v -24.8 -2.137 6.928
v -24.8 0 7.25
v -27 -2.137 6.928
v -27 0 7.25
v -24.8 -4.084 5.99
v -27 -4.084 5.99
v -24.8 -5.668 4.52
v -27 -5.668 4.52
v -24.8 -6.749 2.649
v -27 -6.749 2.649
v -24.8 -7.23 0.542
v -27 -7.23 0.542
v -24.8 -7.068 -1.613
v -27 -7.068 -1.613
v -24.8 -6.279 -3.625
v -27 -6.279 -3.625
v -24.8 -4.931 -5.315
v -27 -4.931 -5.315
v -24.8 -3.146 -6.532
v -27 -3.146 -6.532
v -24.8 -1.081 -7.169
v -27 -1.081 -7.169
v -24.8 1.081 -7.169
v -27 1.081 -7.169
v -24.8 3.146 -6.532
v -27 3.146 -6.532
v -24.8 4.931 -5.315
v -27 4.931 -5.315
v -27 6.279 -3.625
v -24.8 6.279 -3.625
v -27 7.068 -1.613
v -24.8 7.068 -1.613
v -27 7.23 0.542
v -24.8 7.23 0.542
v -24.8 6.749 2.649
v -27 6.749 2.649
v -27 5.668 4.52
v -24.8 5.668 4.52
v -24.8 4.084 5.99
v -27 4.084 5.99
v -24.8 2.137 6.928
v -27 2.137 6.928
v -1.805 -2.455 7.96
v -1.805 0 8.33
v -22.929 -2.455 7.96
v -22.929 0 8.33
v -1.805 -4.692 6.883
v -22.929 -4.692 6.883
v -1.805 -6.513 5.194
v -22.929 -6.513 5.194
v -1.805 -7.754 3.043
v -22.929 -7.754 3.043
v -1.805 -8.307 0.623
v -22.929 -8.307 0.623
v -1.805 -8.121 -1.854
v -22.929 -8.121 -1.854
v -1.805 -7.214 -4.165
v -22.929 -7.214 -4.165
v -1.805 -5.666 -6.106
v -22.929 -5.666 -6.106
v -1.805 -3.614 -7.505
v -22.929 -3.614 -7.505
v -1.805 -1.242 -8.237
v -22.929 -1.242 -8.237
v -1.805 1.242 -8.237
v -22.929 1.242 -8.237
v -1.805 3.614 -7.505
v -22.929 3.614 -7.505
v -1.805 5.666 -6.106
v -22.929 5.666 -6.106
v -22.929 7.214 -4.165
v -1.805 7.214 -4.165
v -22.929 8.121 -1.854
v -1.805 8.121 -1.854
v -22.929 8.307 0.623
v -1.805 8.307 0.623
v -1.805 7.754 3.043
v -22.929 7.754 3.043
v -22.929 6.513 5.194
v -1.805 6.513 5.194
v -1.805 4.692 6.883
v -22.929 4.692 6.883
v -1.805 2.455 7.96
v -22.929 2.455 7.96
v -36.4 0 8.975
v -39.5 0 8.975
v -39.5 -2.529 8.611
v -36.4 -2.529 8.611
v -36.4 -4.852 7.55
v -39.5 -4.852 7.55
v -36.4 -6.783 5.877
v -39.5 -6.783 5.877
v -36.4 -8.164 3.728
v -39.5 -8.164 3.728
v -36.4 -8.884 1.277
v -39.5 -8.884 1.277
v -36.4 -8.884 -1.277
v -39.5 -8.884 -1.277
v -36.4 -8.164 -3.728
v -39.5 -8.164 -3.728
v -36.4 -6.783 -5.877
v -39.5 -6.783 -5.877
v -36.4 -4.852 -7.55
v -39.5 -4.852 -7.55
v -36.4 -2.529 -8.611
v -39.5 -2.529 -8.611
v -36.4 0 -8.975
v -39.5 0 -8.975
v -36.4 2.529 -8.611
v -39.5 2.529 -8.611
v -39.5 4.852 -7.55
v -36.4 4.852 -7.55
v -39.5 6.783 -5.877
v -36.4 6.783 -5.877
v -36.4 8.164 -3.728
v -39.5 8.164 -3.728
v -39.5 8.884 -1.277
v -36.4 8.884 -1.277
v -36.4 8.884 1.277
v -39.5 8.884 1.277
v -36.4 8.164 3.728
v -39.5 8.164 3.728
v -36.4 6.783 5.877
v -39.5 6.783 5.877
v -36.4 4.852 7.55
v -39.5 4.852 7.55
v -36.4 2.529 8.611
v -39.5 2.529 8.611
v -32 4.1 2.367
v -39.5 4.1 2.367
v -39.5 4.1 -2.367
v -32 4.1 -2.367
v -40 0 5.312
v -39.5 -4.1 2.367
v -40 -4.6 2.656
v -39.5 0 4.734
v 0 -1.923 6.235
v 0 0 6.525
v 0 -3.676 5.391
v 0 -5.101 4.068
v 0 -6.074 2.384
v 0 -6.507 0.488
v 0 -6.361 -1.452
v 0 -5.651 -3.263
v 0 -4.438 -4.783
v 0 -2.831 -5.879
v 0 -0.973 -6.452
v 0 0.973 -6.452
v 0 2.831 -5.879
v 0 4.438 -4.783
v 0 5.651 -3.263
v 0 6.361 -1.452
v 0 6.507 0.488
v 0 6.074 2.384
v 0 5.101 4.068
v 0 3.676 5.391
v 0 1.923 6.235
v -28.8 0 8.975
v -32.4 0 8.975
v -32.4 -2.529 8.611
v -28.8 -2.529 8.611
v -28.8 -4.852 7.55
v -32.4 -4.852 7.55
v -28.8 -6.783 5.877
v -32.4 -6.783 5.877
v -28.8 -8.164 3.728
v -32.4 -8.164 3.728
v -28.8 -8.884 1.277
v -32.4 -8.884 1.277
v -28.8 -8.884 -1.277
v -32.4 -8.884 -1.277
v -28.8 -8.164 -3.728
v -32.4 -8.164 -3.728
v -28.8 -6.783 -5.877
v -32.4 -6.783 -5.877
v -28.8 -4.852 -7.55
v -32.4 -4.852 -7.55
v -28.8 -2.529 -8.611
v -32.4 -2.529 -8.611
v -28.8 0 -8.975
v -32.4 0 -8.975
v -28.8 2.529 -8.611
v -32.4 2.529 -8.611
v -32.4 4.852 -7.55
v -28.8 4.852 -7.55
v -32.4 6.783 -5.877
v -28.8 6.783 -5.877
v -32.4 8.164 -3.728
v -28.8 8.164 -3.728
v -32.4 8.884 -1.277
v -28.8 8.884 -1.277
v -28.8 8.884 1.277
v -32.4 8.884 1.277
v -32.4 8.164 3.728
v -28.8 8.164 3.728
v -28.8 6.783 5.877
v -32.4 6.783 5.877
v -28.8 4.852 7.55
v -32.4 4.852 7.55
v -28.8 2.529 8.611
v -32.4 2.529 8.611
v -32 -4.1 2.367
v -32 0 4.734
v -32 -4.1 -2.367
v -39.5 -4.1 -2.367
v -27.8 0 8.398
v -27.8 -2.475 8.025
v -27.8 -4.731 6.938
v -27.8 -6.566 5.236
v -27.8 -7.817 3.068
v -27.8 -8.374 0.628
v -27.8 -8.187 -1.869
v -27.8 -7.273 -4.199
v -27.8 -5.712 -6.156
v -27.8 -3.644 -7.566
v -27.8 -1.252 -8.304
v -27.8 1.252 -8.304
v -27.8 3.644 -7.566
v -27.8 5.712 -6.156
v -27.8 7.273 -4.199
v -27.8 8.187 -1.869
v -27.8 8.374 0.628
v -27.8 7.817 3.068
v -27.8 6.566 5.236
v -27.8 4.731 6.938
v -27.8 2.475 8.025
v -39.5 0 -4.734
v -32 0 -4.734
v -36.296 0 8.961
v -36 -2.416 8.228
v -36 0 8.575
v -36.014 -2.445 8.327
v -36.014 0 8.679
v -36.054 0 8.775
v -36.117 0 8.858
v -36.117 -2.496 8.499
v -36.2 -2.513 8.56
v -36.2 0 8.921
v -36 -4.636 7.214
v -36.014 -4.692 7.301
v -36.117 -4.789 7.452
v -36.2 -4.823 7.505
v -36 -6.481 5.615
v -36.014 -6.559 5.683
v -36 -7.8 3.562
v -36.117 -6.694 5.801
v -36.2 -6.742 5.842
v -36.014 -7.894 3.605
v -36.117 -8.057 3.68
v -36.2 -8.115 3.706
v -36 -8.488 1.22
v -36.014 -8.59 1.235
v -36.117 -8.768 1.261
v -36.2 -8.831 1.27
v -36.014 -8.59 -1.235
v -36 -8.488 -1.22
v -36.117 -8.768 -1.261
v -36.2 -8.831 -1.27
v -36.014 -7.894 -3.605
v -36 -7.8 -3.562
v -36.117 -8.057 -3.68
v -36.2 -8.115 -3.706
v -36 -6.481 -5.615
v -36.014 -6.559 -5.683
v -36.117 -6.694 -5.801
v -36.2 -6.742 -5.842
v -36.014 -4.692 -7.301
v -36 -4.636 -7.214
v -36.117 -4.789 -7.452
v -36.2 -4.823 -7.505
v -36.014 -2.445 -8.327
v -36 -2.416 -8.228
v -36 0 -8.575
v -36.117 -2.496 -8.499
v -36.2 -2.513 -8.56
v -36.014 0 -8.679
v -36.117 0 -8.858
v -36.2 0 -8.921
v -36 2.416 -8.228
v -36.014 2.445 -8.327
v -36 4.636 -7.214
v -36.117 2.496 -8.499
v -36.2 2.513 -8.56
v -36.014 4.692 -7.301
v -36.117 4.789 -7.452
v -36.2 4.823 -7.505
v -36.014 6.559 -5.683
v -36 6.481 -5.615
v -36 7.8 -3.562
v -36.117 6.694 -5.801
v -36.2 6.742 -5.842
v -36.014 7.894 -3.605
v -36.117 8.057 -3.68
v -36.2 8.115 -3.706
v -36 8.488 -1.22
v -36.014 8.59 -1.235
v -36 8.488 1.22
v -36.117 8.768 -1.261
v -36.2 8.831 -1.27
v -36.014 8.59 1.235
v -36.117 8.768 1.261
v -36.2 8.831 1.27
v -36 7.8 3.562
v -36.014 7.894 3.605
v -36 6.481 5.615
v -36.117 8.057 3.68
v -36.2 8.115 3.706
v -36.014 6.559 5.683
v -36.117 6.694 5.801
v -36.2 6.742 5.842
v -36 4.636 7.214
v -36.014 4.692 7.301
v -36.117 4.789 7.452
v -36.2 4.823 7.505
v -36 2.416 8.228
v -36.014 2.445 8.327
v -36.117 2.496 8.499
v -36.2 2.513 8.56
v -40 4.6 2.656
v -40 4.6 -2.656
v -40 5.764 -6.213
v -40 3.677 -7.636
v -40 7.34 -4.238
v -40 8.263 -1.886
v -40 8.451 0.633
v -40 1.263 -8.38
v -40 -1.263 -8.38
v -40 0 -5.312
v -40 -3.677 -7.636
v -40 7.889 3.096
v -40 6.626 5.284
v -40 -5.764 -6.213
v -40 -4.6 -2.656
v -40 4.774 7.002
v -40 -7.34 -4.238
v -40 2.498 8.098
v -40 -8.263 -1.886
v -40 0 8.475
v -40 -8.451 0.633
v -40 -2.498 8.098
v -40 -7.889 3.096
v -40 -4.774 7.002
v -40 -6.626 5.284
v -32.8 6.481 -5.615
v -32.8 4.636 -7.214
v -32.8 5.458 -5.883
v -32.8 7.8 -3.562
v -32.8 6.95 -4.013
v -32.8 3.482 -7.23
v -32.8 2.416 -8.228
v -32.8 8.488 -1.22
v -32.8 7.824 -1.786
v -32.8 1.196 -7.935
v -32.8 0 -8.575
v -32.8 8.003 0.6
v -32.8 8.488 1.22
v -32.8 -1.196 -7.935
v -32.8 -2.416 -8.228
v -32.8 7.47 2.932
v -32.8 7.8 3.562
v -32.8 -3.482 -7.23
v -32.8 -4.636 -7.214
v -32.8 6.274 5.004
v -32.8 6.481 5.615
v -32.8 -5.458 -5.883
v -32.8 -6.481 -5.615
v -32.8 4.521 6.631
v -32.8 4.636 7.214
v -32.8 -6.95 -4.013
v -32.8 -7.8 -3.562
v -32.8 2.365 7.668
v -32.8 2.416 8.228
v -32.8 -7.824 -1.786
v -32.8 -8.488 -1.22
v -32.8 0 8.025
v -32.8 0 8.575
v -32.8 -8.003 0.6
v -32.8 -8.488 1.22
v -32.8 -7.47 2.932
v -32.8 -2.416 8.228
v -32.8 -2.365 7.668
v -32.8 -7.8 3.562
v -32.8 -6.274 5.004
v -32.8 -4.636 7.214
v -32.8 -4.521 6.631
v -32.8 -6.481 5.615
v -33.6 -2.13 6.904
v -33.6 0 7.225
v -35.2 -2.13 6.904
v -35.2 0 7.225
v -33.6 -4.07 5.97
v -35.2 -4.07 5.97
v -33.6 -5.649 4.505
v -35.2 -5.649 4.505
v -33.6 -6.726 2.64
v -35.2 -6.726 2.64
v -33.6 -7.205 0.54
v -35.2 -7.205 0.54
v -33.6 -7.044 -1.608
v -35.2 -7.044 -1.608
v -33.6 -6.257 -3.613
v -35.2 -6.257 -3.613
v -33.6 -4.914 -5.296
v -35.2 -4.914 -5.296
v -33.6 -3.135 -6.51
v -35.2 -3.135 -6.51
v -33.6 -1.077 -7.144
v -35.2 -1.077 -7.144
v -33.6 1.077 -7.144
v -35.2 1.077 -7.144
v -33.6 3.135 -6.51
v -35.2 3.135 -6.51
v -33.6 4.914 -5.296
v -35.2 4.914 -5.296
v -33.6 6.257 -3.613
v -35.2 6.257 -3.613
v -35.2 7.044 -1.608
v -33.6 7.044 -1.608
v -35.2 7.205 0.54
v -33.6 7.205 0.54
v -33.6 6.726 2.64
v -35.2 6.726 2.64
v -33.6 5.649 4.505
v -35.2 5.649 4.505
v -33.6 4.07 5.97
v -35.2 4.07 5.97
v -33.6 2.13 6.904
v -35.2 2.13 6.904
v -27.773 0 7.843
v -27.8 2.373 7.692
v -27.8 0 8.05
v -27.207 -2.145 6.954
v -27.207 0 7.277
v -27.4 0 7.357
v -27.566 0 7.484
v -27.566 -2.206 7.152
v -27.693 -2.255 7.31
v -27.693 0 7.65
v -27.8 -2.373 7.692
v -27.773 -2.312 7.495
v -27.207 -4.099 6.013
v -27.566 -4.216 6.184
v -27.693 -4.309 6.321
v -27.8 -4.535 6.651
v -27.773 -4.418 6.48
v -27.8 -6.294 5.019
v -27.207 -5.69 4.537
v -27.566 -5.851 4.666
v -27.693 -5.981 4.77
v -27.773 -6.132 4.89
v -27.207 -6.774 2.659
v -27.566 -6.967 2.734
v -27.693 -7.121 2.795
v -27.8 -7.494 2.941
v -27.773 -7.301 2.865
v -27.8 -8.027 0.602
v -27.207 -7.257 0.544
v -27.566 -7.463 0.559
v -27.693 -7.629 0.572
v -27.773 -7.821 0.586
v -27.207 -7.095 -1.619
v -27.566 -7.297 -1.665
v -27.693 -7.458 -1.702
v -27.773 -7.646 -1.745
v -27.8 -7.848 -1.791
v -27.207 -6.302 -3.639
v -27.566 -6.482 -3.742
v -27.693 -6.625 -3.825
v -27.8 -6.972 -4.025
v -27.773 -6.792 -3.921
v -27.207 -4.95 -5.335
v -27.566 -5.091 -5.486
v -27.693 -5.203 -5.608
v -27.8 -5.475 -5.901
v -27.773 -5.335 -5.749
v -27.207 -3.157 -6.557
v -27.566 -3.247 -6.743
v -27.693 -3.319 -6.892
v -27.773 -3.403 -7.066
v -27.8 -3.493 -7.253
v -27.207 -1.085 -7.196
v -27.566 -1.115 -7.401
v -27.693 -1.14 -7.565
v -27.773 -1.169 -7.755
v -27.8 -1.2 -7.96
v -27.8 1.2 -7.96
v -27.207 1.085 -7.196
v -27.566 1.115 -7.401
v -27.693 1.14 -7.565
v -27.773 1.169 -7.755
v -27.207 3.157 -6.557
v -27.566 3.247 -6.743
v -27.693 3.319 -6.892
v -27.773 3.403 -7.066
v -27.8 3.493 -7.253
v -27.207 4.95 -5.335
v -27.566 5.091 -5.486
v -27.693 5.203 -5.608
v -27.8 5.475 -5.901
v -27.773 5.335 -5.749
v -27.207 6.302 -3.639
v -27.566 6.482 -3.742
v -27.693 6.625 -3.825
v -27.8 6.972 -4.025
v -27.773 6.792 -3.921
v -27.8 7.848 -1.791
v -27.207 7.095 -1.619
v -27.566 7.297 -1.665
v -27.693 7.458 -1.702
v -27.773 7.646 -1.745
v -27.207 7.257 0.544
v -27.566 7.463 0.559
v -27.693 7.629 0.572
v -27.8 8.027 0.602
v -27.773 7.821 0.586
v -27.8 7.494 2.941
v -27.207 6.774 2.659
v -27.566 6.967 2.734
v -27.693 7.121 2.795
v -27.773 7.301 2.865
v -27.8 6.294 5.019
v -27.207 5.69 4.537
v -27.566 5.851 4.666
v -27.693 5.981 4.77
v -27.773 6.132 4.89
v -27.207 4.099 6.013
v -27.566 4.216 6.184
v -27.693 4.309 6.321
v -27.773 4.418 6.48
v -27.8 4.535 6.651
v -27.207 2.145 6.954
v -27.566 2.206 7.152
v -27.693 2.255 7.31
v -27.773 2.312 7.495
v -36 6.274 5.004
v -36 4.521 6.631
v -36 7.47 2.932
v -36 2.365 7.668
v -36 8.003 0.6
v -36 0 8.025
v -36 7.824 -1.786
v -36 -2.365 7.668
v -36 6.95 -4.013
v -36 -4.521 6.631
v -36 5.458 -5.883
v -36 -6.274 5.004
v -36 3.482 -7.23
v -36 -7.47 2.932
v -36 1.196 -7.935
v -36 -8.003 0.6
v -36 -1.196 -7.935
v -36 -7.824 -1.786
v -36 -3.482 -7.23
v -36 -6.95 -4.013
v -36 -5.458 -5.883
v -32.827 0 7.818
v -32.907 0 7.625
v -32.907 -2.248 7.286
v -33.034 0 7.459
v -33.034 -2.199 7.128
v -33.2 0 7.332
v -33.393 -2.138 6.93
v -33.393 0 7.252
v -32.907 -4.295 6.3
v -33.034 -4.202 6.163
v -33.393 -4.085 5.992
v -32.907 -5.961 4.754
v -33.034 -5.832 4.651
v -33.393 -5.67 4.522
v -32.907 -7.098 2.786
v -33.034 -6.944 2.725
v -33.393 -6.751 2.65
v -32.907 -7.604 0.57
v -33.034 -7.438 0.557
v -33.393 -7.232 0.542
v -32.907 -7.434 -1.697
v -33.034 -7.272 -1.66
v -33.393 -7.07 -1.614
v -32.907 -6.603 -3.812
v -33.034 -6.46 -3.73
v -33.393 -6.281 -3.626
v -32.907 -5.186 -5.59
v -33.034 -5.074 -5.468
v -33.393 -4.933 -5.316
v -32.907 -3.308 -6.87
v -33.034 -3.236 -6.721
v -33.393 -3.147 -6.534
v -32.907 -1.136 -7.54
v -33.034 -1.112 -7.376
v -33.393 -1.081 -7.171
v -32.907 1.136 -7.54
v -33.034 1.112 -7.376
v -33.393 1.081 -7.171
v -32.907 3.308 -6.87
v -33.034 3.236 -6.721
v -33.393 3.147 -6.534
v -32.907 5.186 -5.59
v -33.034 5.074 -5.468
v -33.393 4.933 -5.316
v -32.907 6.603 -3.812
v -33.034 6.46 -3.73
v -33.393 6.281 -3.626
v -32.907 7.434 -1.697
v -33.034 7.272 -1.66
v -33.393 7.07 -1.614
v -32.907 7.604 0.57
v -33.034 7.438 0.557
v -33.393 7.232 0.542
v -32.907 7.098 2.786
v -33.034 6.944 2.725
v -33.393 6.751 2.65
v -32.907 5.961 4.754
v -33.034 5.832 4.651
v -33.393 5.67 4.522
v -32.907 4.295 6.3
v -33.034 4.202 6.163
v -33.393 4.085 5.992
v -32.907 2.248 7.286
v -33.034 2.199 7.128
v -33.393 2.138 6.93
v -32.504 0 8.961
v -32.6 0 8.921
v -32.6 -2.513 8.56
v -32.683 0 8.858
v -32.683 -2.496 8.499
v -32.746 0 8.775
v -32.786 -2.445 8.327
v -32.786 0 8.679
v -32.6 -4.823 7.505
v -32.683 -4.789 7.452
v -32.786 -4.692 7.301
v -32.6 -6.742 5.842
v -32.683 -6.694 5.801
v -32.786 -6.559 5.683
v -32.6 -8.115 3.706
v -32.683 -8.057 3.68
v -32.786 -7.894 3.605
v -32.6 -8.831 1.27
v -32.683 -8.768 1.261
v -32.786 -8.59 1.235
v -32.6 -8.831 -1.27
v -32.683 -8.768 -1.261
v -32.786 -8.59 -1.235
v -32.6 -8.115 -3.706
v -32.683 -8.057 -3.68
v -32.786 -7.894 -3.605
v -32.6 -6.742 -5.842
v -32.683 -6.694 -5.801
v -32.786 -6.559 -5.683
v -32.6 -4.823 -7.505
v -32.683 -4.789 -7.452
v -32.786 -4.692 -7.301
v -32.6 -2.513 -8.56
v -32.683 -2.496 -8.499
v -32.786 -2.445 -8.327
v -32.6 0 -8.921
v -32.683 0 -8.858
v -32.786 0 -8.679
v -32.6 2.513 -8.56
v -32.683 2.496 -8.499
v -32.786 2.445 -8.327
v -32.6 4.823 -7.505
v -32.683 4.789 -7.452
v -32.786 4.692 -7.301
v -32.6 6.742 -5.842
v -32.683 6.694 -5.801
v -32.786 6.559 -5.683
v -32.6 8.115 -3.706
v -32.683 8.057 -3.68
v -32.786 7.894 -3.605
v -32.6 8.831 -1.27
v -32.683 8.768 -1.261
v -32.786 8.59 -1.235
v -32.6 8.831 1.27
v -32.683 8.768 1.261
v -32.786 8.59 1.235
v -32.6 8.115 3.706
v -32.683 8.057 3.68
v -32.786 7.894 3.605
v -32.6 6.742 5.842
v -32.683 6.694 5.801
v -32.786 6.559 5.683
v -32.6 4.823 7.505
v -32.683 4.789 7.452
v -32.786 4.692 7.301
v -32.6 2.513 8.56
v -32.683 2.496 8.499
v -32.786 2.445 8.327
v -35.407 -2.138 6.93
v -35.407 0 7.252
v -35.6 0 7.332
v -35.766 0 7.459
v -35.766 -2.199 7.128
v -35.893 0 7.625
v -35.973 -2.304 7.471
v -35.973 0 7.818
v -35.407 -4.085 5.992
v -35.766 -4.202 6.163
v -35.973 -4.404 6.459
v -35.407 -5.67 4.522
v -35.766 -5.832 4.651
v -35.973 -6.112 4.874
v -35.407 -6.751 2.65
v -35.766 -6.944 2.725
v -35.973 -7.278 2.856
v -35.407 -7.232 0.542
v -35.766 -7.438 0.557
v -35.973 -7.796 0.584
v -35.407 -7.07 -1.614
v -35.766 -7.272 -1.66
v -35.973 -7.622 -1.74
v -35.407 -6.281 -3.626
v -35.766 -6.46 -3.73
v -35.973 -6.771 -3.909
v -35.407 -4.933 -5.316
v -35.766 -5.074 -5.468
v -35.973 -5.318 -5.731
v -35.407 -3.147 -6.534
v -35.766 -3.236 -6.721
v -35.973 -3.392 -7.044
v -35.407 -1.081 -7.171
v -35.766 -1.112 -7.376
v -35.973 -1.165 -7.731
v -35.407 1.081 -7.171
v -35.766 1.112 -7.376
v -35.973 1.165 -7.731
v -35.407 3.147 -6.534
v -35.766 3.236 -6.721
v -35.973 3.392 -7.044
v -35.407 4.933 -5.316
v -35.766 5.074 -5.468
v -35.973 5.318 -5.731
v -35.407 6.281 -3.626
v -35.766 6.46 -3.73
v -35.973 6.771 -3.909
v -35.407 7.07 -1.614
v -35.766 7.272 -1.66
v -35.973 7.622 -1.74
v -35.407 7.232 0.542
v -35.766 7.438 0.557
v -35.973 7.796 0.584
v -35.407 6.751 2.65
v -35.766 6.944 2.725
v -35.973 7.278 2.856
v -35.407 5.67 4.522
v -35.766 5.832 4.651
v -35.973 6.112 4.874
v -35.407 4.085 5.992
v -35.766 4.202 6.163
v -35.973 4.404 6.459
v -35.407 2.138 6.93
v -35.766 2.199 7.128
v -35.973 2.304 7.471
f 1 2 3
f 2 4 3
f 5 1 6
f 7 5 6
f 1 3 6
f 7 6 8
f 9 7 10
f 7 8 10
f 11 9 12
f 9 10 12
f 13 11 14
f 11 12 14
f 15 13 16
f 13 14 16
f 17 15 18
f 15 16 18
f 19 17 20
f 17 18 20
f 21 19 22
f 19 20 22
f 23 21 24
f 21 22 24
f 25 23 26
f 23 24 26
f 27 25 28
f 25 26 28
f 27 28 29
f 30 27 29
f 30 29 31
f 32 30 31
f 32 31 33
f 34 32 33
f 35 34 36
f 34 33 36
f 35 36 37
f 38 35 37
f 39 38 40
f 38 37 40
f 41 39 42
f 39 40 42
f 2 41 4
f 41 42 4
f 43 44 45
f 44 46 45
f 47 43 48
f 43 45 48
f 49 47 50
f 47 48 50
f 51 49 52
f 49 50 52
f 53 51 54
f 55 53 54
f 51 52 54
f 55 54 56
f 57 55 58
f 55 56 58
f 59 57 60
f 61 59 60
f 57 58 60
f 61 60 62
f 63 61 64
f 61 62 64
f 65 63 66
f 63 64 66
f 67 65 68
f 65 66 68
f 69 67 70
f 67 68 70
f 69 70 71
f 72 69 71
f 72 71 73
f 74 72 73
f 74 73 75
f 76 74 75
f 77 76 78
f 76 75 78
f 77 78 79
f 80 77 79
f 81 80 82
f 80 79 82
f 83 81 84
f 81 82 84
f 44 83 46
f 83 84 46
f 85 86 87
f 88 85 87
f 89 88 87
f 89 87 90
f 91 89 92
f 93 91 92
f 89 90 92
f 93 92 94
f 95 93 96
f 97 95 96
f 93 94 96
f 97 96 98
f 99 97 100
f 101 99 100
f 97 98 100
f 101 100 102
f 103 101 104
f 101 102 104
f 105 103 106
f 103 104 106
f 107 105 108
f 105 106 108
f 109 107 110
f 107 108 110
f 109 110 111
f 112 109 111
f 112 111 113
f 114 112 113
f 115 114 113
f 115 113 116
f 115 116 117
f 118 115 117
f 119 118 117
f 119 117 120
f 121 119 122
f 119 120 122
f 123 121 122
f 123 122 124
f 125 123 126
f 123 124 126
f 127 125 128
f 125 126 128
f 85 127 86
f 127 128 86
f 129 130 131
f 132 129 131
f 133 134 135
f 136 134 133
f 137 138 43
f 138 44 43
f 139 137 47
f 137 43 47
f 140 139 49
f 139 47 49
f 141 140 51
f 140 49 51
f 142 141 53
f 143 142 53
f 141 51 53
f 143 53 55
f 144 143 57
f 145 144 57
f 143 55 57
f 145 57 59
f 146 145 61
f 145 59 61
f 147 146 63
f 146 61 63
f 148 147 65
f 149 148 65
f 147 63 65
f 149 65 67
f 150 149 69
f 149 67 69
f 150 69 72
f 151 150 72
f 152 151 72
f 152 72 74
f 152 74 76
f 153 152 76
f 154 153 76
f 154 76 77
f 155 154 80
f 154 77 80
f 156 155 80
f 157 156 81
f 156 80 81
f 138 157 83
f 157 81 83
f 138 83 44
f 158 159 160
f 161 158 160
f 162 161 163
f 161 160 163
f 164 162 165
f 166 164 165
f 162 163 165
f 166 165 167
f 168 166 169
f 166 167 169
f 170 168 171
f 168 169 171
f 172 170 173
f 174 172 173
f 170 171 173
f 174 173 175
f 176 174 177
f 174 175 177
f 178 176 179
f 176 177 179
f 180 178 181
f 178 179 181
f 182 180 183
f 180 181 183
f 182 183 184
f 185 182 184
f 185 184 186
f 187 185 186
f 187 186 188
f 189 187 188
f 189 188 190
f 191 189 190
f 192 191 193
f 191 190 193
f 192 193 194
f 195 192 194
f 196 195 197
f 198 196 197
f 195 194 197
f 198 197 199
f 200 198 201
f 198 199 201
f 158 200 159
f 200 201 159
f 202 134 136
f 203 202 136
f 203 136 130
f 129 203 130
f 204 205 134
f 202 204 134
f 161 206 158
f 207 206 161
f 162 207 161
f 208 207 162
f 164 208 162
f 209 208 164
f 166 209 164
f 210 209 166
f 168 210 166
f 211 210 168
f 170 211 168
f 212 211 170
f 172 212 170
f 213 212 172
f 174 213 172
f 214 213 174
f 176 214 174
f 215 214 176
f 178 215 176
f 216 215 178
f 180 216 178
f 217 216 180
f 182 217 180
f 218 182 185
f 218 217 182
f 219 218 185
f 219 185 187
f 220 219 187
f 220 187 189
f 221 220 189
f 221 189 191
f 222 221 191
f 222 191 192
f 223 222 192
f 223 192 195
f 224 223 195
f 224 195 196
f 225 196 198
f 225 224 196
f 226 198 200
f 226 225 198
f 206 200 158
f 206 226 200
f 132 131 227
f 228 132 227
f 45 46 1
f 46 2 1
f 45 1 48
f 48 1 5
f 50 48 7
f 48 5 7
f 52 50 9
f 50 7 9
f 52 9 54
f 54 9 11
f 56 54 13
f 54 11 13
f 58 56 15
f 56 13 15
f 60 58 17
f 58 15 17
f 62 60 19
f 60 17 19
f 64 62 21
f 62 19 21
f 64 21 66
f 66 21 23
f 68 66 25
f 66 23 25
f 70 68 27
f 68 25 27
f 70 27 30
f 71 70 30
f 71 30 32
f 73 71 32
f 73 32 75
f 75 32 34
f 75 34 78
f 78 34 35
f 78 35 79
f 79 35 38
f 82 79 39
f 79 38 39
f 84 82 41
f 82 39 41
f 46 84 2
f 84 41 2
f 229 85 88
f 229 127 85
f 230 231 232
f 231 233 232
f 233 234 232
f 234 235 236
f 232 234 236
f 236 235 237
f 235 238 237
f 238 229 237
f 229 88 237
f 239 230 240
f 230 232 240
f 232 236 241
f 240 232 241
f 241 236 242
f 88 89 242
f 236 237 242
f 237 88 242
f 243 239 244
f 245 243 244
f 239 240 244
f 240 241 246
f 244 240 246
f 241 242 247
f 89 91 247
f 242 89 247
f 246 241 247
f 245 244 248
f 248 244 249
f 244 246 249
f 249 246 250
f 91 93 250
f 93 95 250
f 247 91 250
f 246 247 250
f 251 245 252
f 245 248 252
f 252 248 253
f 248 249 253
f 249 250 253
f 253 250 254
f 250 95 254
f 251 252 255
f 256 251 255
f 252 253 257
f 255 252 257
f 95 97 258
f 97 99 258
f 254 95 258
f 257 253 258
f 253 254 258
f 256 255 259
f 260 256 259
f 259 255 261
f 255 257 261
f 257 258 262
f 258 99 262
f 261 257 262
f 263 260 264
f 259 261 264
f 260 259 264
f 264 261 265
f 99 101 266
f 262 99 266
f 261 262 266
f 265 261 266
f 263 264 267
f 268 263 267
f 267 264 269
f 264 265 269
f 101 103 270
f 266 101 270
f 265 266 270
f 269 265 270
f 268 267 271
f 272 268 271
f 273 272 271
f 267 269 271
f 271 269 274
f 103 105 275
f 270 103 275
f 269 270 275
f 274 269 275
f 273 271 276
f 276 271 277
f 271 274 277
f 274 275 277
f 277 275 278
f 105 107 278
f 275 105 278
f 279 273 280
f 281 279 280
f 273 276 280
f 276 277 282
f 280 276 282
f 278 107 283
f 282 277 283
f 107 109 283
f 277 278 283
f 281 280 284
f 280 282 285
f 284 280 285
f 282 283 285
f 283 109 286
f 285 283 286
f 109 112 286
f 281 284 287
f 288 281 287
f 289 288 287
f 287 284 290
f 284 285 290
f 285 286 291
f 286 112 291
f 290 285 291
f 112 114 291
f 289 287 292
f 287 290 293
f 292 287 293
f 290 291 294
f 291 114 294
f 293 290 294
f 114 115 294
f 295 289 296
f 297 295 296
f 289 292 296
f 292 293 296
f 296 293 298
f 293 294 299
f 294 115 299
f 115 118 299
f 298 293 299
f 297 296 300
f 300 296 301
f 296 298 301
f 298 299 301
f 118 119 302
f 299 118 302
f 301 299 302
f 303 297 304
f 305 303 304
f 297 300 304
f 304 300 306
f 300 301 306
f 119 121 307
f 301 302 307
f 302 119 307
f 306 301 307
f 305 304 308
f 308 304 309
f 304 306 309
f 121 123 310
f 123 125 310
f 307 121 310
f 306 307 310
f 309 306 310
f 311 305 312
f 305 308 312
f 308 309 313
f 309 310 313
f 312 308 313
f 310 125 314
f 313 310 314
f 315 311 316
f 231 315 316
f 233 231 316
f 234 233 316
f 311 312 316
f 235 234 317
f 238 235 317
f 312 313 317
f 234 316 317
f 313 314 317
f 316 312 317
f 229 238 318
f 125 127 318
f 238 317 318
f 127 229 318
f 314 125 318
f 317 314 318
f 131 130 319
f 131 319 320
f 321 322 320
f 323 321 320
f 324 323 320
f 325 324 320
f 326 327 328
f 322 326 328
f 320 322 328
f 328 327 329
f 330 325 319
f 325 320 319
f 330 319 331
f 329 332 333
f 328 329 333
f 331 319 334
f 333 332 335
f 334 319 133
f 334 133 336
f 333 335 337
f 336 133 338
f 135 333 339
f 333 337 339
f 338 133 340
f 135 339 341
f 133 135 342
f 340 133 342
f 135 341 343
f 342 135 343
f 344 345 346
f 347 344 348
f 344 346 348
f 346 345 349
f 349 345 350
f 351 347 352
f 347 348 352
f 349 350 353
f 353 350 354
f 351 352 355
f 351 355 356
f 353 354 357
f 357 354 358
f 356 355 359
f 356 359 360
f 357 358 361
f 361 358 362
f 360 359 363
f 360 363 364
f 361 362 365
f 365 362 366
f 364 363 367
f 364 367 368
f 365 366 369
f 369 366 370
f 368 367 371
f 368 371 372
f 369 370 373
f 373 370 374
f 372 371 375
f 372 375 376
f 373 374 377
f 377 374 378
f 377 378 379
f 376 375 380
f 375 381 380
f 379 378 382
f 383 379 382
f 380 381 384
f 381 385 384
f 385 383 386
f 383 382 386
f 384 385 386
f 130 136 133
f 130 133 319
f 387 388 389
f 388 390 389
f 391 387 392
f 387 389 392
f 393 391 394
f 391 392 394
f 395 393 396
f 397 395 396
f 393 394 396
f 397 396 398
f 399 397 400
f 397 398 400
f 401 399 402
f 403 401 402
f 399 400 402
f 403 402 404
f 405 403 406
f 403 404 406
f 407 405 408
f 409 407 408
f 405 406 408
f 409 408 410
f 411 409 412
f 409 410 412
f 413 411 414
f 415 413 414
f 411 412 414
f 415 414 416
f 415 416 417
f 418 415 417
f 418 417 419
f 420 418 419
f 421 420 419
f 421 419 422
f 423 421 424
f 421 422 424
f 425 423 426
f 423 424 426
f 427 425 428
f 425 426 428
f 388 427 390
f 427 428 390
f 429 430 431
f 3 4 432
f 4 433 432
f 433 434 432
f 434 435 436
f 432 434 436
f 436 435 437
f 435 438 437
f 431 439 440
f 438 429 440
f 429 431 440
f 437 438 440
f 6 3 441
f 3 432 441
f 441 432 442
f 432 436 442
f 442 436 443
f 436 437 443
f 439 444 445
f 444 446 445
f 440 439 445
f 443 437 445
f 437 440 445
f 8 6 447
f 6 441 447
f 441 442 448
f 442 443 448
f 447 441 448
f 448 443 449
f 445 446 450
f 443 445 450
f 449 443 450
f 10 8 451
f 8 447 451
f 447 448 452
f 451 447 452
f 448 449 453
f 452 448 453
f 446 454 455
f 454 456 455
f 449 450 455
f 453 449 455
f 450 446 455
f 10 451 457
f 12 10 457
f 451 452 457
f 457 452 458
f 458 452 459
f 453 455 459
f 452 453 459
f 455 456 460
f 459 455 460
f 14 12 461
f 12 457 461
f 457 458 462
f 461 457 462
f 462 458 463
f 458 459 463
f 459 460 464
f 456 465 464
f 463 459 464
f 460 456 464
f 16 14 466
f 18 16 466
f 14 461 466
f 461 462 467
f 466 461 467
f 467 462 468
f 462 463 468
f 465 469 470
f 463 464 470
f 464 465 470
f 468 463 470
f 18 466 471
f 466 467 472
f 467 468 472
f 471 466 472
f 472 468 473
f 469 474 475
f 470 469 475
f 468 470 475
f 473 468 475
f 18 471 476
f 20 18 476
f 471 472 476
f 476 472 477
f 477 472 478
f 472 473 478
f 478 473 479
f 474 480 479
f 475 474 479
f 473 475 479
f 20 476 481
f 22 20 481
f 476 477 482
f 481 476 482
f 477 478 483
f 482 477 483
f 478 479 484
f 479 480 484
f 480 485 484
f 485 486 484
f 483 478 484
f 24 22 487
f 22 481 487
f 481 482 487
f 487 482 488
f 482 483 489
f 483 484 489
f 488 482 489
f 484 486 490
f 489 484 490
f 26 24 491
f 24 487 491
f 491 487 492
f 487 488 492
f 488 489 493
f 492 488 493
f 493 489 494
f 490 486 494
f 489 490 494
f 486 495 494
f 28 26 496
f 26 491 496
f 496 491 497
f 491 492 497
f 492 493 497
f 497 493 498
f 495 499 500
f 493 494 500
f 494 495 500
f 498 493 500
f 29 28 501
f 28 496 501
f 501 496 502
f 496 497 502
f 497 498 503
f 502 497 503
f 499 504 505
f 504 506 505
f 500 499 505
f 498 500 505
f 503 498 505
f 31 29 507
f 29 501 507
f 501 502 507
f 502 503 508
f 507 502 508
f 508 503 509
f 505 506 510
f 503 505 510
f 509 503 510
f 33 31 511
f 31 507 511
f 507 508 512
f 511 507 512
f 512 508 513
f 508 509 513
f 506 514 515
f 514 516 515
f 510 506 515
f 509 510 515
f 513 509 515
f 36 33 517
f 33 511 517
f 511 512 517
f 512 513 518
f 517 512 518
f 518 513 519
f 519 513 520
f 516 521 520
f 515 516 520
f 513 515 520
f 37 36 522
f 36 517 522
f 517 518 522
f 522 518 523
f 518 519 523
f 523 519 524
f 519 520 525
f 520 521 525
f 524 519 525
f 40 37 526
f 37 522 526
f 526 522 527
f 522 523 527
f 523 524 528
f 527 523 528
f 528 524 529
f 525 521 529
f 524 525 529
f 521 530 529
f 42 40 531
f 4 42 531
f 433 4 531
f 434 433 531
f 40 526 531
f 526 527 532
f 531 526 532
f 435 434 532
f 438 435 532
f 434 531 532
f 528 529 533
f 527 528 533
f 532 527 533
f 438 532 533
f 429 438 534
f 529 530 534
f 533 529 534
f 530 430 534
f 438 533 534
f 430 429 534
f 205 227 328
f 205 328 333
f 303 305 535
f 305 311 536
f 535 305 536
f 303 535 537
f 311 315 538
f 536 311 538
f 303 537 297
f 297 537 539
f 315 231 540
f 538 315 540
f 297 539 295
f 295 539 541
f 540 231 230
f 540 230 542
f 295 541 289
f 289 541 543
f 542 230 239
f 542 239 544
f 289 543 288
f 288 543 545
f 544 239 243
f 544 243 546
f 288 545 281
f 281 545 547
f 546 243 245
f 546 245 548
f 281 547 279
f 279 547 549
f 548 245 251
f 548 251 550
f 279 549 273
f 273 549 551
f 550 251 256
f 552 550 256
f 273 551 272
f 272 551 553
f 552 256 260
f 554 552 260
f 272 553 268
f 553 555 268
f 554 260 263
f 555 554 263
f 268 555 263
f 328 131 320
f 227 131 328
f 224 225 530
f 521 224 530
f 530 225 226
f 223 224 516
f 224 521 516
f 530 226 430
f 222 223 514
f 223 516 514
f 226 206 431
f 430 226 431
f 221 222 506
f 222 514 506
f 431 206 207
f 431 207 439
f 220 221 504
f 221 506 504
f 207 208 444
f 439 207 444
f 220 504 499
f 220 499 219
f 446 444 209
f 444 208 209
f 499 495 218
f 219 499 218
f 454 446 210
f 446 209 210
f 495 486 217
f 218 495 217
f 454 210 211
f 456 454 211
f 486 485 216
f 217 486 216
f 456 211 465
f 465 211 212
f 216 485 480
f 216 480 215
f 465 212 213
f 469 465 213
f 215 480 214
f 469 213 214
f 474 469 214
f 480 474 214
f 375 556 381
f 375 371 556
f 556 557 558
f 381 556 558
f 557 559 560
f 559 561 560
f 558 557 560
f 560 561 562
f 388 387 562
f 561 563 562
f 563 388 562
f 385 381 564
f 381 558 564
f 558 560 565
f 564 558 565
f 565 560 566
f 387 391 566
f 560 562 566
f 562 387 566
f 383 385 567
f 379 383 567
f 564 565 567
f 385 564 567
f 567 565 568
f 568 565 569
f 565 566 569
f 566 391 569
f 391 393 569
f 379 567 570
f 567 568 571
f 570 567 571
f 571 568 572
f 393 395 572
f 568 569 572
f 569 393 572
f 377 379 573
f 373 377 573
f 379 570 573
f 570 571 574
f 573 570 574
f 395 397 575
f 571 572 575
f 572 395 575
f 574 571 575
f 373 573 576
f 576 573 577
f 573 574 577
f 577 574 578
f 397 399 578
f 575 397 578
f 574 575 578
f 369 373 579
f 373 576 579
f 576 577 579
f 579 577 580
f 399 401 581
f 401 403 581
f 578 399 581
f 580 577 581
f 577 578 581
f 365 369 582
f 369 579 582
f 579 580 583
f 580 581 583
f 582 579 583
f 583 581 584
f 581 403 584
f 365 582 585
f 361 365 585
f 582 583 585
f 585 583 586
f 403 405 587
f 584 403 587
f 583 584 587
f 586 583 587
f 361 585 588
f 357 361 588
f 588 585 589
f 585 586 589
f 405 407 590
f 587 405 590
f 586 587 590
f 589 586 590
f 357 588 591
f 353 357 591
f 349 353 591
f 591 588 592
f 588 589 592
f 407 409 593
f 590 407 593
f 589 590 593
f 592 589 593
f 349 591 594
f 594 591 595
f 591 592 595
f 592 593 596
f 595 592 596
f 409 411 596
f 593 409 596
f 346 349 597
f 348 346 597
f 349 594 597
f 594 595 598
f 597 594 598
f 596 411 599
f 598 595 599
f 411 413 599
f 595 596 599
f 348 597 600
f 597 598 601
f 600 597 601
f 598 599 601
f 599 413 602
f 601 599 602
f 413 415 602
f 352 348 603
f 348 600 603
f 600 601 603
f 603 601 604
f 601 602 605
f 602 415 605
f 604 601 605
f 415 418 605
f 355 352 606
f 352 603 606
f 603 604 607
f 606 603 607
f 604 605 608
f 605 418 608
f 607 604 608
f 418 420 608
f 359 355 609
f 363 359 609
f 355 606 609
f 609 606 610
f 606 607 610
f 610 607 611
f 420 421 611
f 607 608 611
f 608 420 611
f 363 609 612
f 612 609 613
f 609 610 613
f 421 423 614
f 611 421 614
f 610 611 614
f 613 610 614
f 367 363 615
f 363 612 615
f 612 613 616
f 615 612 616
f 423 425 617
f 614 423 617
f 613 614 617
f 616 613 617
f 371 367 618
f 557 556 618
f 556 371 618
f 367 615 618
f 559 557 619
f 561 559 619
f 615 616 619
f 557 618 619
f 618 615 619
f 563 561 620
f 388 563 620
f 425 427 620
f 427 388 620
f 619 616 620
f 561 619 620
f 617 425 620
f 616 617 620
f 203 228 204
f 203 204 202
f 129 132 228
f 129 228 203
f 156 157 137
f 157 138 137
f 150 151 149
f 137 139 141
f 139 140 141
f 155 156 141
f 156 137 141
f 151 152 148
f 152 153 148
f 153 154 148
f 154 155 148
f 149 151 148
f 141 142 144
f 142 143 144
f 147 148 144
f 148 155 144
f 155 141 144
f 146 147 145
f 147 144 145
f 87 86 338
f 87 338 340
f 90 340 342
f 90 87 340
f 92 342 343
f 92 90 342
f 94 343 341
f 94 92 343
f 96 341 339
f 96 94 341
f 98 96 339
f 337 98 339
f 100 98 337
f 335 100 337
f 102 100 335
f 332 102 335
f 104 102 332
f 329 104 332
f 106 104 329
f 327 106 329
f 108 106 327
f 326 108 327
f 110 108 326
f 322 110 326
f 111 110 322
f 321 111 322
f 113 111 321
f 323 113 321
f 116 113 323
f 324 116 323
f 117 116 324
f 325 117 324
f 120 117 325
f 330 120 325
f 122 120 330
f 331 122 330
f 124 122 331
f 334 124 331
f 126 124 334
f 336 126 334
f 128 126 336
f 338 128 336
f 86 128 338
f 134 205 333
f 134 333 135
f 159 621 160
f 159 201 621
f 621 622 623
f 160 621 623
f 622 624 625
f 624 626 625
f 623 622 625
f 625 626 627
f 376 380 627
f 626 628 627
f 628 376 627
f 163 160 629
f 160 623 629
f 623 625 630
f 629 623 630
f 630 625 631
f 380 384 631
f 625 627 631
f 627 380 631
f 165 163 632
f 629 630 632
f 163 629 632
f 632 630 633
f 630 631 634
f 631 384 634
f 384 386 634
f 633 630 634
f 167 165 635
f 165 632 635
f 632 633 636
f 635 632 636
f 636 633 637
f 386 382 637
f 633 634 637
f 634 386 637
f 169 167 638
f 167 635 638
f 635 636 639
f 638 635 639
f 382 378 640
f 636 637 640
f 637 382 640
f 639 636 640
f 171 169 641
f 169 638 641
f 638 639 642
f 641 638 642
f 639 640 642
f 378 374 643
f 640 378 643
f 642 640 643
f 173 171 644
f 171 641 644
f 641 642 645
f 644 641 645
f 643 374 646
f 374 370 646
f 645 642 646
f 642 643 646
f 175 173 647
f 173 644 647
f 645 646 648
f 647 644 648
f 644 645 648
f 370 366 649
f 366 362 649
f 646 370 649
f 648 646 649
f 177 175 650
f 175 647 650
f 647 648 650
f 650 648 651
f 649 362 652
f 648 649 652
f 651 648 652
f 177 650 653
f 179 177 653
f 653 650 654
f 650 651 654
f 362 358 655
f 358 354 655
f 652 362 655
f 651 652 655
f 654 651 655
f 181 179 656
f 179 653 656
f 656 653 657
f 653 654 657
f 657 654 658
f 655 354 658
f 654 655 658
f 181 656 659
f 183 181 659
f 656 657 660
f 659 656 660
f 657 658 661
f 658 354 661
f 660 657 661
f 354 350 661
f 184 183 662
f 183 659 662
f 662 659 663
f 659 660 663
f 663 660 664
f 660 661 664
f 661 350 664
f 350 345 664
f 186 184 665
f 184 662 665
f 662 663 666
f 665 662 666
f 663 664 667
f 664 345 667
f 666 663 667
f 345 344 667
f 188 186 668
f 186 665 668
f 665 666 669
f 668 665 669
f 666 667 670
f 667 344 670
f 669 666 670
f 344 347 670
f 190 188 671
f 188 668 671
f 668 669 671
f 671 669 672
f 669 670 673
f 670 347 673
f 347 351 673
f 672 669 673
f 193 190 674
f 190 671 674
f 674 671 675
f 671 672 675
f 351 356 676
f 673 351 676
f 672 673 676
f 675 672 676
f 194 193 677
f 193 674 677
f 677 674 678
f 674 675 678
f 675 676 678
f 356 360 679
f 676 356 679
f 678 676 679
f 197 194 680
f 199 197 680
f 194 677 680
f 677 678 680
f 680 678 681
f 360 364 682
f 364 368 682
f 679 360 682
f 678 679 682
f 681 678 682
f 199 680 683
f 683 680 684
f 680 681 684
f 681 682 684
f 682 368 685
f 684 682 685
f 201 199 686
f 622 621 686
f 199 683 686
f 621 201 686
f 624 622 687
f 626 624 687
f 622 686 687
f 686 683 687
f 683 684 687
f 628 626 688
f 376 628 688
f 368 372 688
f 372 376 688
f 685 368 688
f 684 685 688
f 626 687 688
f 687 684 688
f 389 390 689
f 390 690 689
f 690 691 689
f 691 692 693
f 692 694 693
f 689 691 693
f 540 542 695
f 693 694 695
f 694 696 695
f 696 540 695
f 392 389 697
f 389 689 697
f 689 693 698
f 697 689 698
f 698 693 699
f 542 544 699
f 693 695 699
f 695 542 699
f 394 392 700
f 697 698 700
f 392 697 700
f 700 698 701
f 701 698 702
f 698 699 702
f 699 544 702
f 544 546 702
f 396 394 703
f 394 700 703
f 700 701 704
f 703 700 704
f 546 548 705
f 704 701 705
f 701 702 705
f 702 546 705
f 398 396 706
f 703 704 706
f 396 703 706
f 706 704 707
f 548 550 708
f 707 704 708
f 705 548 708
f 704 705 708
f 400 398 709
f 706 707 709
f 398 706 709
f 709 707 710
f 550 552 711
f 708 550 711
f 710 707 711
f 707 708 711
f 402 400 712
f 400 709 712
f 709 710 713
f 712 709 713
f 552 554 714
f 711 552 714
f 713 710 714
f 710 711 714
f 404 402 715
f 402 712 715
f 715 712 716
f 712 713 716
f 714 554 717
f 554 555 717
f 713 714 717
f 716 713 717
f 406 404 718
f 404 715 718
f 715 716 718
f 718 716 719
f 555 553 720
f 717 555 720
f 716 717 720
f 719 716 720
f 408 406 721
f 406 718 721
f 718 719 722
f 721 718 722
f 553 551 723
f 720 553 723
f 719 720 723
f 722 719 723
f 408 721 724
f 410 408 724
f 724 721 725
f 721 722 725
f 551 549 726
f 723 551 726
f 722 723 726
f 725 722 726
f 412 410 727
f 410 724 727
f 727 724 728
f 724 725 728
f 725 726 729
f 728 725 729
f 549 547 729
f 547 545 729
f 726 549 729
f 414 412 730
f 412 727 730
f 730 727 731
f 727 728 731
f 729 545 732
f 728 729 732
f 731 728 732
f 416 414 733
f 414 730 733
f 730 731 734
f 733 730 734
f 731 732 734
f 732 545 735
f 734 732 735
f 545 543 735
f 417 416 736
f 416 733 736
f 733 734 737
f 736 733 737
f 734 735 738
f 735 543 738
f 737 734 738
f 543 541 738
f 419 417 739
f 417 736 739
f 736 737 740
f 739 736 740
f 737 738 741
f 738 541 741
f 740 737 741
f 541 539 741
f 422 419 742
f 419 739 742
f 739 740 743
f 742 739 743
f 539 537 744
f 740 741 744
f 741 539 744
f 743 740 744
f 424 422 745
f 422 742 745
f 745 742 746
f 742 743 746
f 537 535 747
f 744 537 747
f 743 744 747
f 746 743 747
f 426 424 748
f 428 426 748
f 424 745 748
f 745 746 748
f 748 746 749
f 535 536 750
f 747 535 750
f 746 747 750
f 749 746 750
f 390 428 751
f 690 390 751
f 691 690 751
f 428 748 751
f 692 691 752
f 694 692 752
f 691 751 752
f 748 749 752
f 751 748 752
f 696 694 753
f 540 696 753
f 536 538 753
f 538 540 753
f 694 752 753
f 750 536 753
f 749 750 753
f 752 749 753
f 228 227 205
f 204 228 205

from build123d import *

# Parameters (mm, degrees)
CUT_EXTRUDE1_DEPTH = 8
CHAMFER1_SIZE      = 0.5
CHAMFER2_SIZE      = 0.5
CHAMFER3_SIZE      = 1
CHAMFER3_SIZE2     = 0.577350269


with BuildPart() as part:
    # Sketch1 → Revolve1 (revolve)
    with BuildSketch(Plane.XY, mode=Mode.PRIVATE) as revolve1_sk:
        with BuildLine():
            Line((0, 0), (0, 6.525))
            Line((0, 6.525), (-1.805, 8.33))
            Line((-1.805, 8.33), (-22.929385128, 8.33))
            Line((-22.929385128, 8.33), (-24.8, 7.25))
            Line((-24.8, 7.25), (-27, 7.25))
            ThreePointArc((-27, 7.25), (-27.565685425, 7.484314575), (-27.8, 8.05))
            Line((-27.8, 8.05), (-27.8, 8.975))
            Line((-27.8, 8.975), (-32.4, 8.975))
            ThreePointArc((-32.4, 8.975), (-32.682842712, 8.857842712), (-32.8, 8.575))
            Line((-32.8, 8.575), (-32.8, 8.025))
            ThreePointArc((-32.8, 8.025), (-33.034314575, 7.459314575), (-33.6, 7.225))
            Line((-33.6, 7.225), (-35.2, 7.225))
            ThreePointArc((-35.2, 7.225), (-35.765685425, 7.459314575), (-36, 8.025))
            Line((-36, 8.025), (-36, 8.575))
            ThreePointArc((-36, 8.575), (-36.117157288, 8.857842712), (-36.4, 8.975))
            Line((-36.4, 8.975), (-40, 8.975))
            Line((-40, 8.975), (-40, 0))
            Line((-40, 0), (0, 0))
        make_face()
    revolve(revolve1_sk.sketch.rotate(Axis((0, 0, 0), (1, 0, 0)), 90), axis=Axis((0, 0, 0), (1, 0, 0)))

    # Sketch2 → Cut-Extrude1 (cut)
    with BuildSketch(Plane.ZY.offset(40)):
        Polygon((2.367136104, 4.1), (-2.367136104, 4.1), (-4.734272207, 0), (-2.367136104, -4.1), (2.367136104, -4.1), (4.734272207, 0), align=None)
    extrude(amount=-CUT_EXTRUDE1_DEPTH, mode=Mode.SUBTRACT)

    # Chamfer1
    chamfer1_edges = [part.edges().sort_by_distance(p)[0] for p in [
        (-40, 2.05, 3.550704156),
        (-40, 4.1, 0),
        (-40, 2.05, -3.550704156),
        (-40, -2.05, -3.550704156),
        (-40, -4.1, 0),
        (-40, -2.05, 3.550704156),
    ]]
    chamfer(chamfer1_edges, length=CHAMFER1_SIZE)

    # Chamfer2
    chamfer2_edges = [part.edges().sort_by_distance(p)[0] for p in [
        (-40, 0, -8.975),
    ]]
    chamfer(chamfer2_edges, length=CHAMFER2_SIZE)

    # Chamfer3
    chamfer3_edges = [part.edges().sort_by_distance(p)[0] for p in [
        (-27.8, 0, -8.975),
    ]]
    chamfer3_side = [part.faces().sort_by_distance(p)[0] for p in [
        (-30.1, 0, -8.975),
    ]]
    chamfer(chamfer3_edges, length=CHAMFER3_SIZE, length2=CHAMFER3_SIZE2, reference=chamfer3_side[0])


solid = part.part
